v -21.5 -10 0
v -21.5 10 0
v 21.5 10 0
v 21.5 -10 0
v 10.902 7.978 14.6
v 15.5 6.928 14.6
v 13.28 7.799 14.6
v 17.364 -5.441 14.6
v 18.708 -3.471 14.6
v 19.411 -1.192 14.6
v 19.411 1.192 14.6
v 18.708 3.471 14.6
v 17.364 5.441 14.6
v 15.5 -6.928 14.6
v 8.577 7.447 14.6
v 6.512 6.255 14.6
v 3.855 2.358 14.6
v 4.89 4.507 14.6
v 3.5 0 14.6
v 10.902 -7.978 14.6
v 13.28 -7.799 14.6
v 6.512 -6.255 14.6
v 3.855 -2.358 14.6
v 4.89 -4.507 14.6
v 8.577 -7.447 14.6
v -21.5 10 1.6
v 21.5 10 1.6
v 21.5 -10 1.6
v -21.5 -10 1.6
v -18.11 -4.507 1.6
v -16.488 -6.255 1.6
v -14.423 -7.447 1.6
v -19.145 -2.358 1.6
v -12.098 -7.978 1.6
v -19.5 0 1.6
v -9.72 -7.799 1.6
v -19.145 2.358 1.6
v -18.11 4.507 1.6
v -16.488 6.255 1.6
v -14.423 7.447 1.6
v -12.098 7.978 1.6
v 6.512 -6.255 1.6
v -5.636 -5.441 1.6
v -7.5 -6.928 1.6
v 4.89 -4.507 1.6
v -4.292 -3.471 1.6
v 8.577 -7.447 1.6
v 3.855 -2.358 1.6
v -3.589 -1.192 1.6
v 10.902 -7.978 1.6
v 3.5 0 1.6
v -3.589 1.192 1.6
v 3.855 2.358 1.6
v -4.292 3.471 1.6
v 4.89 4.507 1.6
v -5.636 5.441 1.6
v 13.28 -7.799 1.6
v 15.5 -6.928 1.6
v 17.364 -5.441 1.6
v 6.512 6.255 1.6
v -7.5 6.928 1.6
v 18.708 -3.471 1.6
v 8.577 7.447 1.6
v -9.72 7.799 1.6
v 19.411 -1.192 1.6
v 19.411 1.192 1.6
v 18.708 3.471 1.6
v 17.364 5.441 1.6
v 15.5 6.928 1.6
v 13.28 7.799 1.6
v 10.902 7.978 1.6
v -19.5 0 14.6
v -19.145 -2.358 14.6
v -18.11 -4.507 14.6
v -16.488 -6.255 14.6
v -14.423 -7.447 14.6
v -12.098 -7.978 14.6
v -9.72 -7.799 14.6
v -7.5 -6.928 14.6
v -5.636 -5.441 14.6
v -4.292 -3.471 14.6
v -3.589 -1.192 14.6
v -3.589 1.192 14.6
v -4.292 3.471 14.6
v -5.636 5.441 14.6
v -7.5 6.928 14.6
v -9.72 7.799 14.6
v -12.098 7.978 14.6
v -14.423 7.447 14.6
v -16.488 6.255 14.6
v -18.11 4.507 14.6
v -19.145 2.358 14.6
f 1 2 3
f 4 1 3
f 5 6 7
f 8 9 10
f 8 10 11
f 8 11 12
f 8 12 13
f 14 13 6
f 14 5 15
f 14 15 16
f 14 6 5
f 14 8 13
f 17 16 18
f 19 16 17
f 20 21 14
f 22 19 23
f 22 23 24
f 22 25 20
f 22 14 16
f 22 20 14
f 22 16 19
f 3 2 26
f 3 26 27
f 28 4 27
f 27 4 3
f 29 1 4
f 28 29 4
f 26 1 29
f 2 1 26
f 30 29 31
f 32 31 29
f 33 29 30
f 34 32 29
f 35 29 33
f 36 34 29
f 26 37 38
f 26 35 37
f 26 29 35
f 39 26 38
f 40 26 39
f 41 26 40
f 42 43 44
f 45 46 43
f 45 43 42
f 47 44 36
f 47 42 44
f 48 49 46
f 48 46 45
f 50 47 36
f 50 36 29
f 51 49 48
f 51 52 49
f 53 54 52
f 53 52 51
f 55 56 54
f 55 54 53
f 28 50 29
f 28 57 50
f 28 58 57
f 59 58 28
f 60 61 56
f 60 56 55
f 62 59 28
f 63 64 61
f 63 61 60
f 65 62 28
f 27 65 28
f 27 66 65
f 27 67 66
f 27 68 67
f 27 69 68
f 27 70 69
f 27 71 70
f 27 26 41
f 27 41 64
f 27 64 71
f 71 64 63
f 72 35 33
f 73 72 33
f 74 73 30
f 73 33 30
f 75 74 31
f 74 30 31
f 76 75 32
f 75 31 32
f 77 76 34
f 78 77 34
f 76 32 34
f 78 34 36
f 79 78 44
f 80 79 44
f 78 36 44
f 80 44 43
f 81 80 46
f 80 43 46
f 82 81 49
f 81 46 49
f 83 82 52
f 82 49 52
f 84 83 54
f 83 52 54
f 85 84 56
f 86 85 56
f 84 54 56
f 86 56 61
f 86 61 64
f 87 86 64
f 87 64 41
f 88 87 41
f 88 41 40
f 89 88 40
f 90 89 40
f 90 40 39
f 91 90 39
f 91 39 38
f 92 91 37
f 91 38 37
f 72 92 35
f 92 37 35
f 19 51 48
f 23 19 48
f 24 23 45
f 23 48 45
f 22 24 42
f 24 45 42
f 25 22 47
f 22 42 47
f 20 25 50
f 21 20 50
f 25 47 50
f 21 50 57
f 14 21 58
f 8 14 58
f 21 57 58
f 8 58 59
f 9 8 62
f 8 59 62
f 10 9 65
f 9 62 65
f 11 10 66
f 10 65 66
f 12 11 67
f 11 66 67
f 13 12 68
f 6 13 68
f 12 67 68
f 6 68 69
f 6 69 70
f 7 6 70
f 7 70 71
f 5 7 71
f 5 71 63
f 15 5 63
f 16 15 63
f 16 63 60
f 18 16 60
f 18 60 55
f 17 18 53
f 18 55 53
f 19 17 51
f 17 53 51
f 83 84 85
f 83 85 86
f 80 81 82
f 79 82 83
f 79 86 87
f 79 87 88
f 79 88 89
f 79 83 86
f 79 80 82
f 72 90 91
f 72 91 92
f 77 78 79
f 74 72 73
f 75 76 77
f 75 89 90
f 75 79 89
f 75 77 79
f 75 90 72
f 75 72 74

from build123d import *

# Parameters (mm, degrees)
SKETCH1_W           = 43
SKETCH1_H           = 20
BOSS_EXTRUDE1_DEPTH = 1.6
SKETCH2_R           = 8
BOSS_EXTRUDE2_DEPTH = 13


with BuildPart() as part:
    # Sketch1 → Boss-Extrude1 (new body)
    with BuildSketch(Plane.XY):
        Rectangle(SKETCH1_W, SKETCH1_H)
    extrude(amount=BOSS_EXTRUDE1_DEPTH)

    # Sketch2 → Boss-Extrude2 (add)
    with BuildSketch(Plane.XY.offset(1.6)):
        with Locations(Location((-11.5, 0, 0), (0, 0, 180))):
            Circle(SKETCH2_R)
        with Locations(Location((11.5, 0, 0), (0, 0, 180))):
            Circle(SKETCH2_R)
    extrude(amount=BOSS_EXTRUDE2_DEPTH)


solid = part.part
